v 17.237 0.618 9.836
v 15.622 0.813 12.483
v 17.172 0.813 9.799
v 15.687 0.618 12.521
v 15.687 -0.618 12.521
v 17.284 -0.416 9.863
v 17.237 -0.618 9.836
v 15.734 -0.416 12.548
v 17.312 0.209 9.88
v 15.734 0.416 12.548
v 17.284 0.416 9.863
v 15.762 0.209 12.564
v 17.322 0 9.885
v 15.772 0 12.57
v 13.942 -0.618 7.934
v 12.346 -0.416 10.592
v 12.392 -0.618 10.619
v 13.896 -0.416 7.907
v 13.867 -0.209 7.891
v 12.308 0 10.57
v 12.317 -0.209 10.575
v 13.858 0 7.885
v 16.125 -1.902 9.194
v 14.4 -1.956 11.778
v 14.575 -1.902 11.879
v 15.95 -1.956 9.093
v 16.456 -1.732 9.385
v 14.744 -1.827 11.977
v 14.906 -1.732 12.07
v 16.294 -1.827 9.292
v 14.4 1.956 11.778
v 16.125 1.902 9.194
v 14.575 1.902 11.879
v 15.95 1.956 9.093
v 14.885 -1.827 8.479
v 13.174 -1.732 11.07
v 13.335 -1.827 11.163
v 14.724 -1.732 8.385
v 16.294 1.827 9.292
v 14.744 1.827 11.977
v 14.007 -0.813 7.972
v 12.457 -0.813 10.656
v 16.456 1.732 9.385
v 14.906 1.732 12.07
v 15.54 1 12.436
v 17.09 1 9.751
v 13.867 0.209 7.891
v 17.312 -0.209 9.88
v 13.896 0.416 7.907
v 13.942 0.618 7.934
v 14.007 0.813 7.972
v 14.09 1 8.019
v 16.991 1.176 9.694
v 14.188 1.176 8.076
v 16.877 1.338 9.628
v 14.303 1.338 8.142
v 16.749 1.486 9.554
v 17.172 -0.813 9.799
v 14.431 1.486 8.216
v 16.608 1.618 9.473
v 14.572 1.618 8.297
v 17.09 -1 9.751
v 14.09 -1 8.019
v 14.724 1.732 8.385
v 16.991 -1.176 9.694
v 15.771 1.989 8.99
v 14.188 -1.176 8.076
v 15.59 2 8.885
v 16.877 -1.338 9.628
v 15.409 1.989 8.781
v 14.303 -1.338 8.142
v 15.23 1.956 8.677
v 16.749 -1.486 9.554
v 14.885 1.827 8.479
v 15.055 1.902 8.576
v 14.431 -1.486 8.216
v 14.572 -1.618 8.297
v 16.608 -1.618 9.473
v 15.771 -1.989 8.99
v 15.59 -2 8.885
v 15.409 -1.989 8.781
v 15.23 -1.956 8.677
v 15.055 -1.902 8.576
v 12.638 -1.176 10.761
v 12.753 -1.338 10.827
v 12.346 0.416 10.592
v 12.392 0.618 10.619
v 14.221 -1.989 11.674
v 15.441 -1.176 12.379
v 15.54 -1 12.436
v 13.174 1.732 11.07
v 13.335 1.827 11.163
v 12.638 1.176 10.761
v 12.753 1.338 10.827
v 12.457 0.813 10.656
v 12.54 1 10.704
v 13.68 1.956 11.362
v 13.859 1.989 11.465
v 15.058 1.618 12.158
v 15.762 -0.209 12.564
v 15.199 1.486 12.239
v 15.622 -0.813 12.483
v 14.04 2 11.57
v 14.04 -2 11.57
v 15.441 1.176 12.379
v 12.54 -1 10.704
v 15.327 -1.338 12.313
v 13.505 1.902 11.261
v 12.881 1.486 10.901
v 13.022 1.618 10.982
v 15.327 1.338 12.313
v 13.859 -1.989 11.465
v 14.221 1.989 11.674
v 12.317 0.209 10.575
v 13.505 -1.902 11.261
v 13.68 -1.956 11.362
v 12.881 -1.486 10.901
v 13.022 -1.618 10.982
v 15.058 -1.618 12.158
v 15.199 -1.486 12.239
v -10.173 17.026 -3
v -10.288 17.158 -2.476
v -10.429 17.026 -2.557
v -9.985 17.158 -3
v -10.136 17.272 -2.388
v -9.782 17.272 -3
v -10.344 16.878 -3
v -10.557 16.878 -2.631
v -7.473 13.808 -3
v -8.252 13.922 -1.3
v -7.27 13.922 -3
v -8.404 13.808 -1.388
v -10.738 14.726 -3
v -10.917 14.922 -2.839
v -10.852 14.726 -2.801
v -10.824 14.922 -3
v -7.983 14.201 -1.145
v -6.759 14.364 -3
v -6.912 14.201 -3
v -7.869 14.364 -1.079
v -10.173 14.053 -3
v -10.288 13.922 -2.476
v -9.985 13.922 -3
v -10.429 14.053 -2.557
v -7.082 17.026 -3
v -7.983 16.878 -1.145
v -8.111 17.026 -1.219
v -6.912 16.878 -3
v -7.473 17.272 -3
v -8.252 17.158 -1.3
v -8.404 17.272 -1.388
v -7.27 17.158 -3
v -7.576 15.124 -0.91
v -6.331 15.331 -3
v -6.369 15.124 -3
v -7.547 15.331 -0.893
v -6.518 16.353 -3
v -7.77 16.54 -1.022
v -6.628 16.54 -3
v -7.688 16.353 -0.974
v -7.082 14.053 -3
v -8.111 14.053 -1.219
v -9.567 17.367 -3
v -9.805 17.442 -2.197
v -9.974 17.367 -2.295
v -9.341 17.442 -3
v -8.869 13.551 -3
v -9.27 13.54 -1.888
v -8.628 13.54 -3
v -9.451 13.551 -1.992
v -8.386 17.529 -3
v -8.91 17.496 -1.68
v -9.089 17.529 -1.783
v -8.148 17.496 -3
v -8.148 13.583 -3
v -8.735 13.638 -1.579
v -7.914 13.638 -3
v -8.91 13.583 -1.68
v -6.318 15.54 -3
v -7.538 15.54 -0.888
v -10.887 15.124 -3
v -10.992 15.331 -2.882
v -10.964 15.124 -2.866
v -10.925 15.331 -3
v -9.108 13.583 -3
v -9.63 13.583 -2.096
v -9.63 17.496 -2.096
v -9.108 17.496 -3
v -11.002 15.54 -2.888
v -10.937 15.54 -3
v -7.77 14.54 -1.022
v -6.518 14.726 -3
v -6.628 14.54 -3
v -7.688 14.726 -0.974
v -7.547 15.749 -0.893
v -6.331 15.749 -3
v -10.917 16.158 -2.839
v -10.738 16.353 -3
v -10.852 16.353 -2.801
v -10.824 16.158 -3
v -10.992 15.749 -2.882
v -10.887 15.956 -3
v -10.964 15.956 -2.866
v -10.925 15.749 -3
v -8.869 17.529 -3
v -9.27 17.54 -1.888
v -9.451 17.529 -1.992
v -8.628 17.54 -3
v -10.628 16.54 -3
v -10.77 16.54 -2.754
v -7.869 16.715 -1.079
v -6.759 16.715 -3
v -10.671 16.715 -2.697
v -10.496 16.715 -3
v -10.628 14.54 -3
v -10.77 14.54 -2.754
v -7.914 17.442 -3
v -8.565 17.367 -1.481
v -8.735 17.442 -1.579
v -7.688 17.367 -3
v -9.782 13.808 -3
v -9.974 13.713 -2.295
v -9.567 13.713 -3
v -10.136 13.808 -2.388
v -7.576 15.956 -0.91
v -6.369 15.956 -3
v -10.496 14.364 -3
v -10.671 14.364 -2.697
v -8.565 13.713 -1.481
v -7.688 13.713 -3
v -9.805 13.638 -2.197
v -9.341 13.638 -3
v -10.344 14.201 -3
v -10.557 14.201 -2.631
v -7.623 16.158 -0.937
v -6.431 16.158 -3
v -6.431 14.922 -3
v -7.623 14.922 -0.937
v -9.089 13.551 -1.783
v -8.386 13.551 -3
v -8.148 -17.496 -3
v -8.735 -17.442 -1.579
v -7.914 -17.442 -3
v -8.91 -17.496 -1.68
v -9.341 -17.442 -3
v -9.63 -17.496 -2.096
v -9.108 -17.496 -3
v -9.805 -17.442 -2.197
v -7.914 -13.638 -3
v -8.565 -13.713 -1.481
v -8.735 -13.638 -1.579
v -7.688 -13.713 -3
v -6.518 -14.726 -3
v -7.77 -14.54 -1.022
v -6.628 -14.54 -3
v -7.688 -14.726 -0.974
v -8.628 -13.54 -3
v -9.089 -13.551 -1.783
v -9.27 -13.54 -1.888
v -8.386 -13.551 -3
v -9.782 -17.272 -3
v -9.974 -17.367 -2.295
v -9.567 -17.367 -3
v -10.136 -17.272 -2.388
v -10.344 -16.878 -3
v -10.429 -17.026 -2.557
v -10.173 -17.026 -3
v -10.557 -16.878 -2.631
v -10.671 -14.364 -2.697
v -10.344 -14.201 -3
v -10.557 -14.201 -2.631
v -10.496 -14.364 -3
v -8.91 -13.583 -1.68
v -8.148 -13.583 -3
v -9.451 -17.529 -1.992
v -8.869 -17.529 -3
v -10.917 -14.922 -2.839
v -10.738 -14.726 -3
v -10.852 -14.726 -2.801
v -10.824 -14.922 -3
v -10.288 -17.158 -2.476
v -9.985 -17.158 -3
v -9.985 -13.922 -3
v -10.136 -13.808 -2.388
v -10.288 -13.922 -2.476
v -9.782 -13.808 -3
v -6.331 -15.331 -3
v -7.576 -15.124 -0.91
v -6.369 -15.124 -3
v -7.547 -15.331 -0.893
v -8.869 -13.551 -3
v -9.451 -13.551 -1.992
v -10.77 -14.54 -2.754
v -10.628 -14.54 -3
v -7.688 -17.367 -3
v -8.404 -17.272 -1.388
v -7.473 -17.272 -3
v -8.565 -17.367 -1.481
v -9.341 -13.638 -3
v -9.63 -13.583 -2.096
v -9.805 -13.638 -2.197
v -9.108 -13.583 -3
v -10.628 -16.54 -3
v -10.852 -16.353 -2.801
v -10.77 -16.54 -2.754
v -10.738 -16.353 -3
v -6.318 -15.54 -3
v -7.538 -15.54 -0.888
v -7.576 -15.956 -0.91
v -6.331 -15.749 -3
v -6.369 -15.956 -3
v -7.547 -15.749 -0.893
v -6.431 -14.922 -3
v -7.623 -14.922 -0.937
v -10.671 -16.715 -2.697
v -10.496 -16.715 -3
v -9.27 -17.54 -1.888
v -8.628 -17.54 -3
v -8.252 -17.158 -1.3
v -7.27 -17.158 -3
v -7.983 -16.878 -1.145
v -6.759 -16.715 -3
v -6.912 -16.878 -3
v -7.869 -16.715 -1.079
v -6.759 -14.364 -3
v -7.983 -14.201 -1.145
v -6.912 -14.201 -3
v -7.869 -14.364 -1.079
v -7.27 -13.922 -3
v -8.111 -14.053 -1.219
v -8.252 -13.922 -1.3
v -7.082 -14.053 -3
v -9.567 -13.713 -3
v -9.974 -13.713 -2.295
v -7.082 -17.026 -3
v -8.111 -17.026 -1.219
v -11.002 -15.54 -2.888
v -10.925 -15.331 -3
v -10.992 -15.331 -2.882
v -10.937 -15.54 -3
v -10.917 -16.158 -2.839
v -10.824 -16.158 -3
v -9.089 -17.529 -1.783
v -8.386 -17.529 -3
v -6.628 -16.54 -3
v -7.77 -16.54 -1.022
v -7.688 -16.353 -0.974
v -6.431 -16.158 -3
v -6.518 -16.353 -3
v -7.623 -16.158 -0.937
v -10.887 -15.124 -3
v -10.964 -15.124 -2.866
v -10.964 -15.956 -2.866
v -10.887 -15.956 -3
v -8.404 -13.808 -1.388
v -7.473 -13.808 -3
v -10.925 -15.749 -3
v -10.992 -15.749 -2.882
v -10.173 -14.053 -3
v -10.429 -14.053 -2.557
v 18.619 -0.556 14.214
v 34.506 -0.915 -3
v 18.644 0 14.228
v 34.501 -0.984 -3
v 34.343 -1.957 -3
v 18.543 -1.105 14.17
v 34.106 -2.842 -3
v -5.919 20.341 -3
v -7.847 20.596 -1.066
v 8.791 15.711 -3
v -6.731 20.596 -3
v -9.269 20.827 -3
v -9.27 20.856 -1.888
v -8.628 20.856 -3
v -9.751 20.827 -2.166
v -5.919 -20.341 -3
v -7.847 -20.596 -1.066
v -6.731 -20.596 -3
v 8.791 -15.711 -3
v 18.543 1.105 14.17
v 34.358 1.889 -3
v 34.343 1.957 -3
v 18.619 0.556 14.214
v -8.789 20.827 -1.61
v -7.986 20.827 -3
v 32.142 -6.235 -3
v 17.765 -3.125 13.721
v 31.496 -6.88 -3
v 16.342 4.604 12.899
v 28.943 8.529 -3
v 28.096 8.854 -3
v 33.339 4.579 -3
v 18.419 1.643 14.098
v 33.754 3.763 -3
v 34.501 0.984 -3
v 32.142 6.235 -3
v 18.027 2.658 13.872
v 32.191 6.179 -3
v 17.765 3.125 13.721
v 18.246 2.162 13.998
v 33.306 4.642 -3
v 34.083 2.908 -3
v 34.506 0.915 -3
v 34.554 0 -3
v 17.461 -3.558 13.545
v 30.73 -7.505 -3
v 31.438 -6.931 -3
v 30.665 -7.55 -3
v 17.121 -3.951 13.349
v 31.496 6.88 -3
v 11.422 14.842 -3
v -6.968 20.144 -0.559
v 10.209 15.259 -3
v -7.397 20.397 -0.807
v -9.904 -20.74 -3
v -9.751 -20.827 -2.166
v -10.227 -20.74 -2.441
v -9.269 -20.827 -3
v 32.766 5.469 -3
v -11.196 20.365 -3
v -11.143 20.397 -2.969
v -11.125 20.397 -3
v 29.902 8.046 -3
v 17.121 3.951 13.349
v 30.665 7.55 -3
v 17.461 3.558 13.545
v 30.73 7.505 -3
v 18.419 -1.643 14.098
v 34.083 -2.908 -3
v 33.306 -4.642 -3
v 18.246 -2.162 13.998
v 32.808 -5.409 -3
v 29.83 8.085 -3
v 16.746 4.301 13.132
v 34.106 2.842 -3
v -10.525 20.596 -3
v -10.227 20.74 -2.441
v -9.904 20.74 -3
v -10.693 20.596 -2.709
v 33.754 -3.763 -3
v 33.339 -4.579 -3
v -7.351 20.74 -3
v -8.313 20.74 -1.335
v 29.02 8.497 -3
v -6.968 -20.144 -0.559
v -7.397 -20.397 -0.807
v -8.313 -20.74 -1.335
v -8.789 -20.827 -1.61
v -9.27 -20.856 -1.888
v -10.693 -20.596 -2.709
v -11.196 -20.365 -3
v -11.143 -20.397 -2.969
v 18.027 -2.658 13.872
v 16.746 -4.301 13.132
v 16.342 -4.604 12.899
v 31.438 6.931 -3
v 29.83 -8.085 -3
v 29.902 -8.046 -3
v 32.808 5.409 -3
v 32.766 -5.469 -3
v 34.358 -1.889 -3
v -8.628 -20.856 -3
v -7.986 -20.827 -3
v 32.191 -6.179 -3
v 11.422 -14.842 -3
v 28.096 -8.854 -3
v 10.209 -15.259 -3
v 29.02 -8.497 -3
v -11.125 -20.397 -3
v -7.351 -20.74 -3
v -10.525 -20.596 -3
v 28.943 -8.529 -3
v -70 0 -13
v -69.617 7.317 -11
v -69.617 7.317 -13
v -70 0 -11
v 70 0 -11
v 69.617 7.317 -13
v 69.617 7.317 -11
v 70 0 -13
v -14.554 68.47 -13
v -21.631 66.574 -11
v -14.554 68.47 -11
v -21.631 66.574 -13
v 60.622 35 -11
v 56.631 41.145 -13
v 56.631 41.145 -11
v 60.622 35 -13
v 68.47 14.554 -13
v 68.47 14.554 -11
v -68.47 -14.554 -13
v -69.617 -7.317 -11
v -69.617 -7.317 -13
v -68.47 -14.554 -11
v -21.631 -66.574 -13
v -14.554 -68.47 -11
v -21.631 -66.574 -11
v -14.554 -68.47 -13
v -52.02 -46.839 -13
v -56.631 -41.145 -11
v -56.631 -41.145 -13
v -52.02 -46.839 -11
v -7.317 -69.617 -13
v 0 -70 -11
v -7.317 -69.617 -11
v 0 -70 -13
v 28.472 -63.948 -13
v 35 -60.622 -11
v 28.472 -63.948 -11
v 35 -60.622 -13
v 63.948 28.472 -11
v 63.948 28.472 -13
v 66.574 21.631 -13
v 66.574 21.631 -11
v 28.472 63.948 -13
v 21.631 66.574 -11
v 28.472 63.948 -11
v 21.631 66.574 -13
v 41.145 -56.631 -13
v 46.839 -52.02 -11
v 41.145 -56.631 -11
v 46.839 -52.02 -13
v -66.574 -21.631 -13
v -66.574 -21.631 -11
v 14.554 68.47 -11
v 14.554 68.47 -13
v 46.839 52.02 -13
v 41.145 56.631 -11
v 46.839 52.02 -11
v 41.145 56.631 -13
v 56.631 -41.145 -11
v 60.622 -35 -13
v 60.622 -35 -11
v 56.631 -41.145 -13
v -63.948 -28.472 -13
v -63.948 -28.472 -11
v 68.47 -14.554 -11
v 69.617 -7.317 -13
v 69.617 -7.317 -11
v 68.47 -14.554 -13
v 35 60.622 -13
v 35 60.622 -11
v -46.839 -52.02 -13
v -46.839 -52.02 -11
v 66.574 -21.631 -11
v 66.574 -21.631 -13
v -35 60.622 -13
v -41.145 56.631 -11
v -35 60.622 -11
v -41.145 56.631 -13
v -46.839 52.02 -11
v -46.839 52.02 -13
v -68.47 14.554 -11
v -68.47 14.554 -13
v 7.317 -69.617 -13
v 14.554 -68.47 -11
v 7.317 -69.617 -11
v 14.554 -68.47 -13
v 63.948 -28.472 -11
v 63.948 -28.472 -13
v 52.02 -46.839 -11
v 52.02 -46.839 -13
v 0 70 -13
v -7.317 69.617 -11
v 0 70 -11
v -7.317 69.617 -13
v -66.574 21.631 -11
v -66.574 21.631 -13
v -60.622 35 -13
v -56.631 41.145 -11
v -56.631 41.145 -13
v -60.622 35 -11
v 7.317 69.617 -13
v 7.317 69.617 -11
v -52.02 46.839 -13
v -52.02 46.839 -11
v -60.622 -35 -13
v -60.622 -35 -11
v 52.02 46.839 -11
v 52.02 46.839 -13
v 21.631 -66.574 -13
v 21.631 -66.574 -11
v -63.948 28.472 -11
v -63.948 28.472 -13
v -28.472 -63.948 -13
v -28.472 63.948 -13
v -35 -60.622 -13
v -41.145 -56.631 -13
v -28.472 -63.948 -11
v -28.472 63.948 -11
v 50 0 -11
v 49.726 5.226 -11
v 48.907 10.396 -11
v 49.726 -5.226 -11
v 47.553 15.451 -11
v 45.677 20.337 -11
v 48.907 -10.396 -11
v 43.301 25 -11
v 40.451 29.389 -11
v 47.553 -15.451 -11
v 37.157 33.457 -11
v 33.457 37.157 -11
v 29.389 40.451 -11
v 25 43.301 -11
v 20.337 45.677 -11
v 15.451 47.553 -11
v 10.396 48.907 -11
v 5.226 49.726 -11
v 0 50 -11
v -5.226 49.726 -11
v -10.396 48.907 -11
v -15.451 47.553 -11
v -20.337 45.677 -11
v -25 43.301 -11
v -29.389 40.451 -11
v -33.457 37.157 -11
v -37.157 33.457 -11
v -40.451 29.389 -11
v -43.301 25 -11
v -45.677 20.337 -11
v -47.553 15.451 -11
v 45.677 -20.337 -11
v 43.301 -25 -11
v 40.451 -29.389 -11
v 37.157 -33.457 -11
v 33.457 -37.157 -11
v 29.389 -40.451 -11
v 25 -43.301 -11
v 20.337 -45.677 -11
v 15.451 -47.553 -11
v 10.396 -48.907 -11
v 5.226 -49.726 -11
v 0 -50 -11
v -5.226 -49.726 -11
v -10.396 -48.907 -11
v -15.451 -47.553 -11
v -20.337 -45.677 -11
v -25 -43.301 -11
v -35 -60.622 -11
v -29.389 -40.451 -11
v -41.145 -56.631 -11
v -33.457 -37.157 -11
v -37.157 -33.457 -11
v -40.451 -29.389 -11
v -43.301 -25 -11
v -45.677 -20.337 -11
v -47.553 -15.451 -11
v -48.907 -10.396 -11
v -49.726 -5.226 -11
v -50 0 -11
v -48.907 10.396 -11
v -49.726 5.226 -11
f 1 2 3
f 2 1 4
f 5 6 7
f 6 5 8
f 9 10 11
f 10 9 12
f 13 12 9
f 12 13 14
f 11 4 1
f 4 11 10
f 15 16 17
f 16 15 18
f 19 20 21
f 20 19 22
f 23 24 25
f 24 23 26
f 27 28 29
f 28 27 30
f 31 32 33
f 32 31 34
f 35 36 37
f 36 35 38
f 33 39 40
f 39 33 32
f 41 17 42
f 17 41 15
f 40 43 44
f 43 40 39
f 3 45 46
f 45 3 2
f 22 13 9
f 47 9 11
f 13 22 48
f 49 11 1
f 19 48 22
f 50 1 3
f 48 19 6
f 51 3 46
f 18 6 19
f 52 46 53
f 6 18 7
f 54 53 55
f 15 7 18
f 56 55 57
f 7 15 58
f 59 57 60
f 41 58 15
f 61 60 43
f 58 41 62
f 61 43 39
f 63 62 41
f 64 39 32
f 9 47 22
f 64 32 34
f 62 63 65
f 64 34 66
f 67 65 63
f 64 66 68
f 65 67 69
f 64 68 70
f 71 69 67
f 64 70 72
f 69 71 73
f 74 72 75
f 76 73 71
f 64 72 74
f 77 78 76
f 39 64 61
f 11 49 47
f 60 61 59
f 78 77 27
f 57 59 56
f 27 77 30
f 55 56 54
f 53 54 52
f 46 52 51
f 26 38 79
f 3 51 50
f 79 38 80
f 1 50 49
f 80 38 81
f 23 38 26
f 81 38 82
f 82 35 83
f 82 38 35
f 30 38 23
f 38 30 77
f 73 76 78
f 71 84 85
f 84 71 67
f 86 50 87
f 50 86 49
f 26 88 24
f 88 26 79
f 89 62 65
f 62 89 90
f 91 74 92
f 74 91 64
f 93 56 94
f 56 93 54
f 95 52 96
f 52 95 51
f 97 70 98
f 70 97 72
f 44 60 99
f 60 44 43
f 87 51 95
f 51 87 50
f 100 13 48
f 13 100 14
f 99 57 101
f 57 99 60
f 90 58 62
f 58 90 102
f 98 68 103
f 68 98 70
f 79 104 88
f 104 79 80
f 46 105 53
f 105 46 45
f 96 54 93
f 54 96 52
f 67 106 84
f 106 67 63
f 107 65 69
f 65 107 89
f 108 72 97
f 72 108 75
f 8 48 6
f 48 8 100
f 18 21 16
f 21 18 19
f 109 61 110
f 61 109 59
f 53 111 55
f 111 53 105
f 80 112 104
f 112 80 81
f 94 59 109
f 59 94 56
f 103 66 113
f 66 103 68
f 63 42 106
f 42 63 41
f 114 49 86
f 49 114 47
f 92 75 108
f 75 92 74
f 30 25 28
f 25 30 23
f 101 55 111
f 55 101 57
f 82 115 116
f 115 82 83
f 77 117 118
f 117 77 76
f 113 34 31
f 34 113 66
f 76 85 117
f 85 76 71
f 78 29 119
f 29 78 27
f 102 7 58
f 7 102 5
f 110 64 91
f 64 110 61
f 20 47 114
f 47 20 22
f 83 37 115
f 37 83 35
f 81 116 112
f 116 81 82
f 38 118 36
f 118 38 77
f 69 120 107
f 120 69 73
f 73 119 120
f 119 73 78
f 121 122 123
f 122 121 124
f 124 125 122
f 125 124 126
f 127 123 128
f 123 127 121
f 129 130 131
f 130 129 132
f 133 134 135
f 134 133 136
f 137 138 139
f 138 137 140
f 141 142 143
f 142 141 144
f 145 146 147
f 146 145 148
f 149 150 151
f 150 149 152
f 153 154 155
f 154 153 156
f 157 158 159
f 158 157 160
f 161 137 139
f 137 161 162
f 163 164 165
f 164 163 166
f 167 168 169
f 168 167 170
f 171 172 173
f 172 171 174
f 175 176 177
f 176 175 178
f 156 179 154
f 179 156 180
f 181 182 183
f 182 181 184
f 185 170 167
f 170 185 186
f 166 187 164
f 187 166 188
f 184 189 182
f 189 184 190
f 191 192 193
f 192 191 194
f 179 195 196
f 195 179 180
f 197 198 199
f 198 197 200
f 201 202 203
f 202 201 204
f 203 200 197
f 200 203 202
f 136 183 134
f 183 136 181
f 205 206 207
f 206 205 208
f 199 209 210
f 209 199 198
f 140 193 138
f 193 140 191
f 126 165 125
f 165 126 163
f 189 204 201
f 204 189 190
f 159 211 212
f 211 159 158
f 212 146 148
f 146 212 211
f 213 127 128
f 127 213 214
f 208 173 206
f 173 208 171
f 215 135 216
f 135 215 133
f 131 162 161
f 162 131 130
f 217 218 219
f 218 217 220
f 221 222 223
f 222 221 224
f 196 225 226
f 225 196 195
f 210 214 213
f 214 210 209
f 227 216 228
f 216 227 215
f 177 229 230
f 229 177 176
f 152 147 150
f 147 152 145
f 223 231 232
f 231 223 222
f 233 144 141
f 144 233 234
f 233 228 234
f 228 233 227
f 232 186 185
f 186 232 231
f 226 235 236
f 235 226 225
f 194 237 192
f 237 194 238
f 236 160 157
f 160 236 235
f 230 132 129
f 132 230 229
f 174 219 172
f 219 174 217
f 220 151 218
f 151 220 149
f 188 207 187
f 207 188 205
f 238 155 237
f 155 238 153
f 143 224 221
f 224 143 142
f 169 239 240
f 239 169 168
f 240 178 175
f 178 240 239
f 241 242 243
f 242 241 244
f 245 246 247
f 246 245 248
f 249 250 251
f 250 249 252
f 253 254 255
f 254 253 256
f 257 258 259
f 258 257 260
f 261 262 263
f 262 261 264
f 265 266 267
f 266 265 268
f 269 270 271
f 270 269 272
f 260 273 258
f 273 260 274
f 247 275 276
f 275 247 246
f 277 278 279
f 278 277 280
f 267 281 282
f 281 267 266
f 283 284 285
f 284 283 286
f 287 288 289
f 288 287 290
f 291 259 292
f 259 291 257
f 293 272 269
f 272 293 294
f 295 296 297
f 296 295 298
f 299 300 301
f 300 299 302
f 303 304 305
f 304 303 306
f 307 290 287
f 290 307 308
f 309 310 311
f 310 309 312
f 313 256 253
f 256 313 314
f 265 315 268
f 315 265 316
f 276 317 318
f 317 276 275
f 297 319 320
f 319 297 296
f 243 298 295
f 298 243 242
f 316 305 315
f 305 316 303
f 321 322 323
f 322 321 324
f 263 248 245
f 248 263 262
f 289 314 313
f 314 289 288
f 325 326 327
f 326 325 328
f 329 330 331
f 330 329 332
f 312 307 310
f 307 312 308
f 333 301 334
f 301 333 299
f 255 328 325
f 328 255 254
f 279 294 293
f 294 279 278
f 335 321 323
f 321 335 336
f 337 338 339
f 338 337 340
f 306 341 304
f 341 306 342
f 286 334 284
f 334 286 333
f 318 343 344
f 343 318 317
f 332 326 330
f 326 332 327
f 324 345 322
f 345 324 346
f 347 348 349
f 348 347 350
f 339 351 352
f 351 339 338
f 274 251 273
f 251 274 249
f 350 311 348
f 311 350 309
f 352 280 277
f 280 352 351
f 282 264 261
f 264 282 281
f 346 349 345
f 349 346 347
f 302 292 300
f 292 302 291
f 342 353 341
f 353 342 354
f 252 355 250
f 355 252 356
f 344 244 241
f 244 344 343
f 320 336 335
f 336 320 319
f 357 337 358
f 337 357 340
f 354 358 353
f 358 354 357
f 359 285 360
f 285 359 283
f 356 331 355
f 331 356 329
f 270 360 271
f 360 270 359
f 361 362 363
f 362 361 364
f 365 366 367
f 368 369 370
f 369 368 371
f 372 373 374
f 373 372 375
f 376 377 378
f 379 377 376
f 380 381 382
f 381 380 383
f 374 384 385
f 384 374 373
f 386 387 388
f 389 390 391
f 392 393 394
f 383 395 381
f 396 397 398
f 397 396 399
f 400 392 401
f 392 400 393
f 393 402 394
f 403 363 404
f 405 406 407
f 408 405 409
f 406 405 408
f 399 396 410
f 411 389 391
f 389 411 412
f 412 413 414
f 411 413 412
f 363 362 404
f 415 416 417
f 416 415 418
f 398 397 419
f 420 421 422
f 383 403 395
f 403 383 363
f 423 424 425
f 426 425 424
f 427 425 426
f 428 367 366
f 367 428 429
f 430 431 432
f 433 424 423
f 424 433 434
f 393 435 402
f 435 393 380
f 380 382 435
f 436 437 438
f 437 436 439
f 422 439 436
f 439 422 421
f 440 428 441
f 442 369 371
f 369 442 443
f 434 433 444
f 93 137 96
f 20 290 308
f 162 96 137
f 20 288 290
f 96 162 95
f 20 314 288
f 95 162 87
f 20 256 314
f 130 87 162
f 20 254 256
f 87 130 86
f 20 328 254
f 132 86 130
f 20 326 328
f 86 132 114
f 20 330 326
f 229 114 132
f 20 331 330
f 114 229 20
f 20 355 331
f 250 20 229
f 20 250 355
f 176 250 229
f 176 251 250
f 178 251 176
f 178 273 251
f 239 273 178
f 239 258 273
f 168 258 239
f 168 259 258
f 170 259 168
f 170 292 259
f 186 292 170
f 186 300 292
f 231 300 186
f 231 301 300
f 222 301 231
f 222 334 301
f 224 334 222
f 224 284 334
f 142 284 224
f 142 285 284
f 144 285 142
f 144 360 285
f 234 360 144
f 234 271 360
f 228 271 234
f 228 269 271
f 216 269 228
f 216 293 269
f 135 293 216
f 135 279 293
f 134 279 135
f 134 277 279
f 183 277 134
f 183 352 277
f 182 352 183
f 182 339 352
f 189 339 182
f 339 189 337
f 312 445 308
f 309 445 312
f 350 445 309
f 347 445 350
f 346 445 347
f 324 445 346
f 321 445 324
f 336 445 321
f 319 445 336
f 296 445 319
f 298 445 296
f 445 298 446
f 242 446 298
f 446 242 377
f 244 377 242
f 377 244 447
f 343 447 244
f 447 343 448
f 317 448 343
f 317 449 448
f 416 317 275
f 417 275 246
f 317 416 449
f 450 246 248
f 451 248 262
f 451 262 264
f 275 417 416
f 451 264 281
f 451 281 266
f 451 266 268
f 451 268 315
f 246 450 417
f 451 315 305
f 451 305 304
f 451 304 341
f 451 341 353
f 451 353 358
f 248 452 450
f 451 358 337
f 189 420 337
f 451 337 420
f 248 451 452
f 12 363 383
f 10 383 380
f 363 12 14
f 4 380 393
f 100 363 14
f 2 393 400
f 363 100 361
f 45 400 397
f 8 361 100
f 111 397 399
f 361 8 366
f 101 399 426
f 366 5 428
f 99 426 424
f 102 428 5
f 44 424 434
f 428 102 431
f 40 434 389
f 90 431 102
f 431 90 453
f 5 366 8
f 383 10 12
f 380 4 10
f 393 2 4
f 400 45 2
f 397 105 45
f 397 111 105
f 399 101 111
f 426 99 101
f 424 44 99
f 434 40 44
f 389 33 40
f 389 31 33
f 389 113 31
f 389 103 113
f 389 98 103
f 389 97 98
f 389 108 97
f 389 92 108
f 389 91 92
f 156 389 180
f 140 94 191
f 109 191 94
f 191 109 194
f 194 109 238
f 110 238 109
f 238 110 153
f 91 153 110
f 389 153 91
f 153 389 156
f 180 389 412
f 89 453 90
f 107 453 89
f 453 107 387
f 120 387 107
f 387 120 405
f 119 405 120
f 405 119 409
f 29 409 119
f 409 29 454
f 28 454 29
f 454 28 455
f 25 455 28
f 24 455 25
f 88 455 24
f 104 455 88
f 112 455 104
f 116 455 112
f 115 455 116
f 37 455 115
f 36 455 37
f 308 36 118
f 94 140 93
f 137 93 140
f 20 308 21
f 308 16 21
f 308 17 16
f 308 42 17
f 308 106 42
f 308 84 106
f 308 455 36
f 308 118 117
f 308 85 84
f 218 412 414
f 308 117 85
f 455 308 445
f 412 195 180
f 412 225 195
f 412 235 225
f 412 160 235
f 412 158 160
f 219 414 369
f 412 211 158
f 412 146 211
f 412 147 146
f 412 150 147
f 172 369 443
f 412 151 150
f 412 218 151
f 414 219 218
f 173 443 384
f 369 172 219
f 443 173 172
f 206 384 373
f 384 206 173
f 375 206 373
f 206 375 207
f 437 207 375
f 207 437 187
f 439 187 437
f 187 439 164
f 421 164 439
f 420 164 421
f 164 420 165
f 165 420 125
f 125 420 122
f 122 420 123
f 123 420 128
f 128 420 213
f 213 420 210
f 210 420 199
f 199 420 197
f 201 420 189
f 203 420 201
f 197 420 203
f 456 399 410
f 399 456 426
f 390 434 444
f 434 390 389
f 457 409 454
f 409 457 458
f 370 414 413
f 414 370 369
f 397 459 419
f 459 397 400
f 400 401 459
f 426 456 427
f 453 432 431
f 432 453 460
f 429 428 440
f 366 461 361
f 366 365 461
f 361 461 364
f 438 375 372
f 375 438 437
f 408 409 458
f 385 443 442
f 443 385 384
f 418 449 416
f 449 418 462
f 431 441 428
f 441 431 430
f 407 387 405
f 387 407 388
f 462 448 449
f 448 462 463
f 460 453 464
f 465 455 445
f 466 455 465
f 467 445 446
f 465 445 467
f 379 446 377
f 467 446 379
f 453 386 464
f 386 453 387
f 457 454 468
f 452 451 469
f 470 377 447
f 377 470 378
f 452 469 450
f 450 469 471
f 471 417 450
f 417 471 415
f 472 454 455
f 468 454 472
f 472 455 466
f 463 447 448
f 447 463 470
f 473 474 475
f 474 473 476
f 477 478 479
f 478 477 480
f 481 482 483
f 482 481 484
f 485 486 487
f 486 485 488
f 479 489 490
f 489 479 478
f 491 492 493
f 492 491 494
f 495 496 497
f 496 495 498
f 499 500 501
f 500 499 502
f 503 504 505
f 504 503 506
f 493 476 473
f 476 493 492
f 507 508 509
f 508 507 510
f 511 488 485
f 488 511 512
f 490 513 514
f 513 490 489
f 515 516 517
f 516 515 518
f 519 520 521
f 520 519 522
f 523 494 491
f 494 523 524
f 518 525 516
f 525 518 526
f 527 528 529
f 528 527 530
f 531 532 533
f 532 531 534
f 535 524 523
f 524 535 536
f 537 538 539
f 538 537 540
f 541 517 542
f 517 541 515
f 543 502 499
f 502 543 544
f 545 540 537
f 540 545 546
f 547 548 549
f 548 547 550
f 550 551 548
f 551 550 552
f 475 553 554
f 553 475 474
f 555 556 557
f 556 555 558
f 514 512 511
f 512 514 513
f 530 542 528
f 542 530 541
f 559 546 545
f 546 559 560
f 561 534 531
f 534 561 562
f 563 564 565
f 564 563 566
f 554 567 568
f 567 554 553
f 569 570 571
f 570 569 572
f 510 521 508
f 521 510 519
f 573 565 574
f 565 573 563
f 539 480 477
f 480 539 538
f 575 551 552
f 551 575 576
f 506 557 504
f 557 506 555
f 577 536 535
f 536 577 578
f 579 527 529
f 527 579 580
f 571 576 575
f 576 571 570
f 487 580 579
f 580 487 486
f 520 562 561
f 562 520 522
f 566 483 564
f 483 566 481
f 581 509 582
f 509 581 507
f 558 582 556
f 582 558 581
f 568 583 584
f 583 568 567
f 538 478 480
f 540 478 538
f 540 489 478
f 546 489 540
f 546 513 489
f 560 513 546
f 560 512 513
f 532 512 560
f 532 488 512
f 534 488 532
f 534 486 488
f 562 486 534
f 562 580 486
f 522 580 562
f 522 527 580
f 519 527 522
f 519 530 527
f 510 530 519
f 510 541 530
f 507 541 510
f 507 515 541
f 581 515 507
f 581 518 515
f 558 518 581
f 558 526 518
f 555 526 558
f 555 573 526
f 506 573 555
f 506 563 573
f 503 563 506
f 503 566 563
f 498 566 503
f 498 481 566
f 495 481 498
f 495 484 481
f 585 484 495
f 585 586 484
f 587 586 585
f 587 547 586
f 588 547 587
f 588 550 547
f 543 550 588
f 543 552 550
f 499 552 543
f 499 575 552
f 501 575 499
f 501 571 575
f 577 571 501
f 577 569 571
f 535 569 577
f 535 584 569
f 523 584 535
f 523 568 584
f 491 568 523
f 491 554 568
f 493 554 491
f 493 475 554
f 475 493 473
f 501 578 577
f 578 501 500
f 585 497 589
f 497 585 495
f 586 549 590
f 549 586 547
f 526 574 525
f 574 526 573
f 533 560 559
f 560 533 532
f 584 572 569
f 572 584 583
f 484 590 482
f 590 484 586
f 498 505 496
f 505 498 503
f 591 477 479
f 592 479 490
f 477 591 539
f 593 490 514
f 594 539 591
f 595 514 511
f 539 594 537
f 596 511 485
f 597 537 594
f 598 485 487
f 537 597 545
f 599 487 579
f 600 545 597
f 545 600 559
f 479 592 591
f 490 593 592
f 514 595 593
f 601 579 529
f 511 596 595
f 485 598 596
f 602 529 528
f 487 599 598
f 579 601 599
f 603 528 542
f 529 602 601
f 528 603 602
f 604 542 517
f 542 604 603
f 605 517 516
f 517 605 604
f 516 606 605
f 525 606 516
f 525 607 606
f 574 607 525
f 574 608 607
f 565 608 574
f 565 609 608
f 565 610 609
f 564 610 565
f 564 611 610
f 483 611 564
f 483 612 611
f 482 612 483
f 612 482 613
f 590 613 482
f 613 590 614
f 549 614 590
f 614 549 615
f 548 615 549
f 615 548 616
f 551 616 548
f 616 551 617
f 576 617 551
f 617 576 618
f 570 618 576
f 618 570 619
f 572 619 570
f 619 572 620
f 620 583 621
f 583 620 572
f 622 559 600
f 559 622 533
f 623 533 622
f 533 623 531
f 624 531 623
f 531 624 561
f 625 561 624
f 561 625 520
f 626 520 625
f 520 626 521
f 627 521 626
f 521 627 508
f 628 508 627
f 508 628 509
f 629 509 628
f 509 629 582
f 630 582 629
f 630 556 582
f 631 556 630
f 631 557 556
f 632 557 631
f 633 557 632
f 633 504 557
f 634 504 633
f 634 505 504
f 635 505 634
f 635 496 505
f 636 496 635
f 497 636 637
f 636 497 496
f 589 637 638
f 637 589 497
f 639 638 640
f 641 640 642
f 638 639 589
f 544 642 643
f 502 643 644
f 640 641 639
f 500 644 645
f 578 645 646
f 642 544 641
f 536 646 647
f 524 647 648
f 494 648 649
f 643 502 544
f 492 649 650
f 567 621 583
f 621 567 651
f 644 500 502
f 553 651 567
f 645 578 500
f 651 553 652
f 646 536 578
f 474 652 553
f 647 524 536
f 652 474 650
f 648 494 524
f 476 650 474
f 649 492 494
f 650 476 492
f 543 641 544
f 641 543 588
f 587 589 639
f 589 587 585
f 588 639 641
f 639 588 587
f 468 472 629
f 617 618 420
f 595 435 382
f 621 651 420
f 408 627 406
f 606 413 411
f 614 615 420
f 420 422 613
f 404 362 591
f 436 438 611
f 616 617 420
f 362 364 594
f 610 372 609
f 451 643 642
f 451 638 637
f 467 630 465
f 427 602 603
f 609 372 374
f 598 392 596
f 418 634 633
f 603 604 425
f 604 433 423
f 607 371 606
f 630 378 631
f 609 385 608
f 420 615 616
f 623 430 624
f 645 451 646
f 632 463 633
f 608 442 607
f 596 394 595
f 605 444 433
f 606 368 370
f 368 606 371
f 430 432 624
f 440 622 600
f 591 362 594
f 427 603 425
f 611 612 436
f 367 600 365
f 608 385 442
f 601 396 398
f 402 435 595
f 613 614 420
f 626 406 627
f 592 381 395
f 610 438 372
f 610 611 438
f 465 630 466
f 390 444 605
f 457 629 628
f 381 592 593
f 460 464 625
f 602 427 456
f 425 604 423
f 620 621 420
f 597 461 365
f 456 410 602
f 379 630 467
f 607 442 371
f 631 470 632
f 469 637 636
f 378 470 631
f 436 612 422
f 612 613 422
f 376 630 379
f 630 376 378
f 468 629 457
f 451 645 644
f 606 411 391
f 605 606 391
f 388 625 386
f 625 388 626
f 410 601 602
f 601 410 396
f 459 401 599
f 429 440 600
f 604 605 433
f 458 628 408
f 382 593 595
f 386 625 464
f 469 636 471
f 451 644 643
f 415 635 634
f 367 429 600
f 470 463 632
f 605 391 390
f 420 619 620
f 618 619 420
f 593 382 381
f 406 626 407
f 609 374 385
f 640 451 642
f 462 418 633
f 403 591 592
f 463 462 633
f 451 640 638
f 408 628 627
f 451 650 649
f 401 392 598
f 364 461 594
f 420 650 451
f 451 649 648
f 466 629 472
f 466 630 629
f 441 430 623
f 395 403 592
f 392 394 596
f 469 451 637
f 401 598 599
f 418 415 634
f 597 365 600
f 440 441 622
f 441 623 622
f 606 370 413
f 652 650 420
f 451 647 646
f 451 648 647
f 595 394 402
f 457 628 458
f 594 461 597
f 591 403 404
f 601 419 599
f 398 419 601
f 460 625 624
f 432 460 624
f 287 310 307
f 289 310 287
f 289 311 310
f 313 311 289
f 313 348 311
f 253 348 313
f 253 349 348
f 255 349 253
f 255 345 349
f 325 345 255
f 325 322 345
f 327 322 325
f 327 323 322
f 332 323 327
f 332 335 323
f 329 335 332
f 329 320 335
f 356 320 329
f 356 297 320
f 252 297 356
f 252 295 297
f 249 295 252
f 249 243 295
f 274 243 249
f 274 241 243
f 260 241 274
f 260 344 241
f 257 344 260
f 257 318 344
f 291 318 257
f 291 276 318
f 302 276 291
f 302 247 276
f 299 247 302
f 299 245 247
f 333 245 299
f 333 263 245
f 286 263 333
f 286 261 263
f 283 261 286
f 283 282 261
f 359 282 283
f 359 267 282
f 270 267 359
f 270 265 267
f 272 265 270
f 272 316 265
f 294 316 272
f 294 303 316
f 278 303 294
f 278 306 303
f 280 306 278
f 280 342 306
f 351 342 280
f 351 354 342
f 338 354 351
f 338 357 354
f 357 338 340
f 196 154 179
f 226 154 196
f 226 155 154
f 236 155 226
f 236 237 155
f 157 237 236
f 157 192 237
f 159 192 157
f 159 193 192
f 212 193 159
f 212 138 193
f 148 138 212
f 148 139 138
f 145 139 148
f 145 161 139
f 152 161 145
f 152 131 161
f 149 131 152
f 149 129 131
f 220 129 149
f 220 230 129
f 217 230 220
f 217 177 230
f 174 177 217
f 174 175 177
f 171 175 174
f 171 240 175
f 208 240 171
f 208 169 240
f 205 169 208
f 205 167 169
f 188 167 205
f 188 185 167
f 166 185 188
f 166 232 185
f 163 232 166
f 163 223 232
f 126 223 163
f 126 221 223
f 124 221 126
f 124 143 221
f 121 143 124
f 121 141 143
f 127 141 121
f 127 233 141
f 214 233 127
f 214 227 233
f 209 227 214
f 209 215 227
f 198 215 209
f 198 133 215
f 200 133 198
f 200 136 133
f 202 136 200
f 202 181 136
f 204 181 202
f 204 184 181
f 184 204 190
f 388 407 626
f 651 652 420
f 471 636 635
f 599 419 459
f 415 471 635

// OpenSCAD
$fn=60;

bottom_support=1;
side_support=0;

bearing_diameter = 11;
bearing_height = 3.8;
magnet_diameter = 13;
magnet_height = 4.2;

bolt_height = 3.6;
nut_height = 4.8;
bolt_radius=4.7;
bearing_spacing = 6.6;
board_thickness = 3.5;
bottom_thickness = 1.6;

total_height = bolt_height+magnet_height+nut_height+bearing_height+bearing_spacing+bearing_height+board_thickness + bottom_thickness;

module ocylinder(r, h) {
    translate([0, 0, -.1])
        cylinder(r=r, h=h+.2);
}

total_radius = total_height*.5;

board_dimension=18;
screw_diameter=4;

module mount() {
    difference() {  union() {
      difference() {
        hull() {
            translate([20, 0, -19])
            rotate([0, 30, 0])
            cylinder(r=10, h=2, center=true);
            for(i=[0:2]) {
                rotate(120*i)
                    translate([total_radius+total_height/16, 0, 0])
                        cylinder(h=3, r=total_height/6);
            }
         }
        for(i=[0:2]) {
            rotate(120*i)
               translate([total_radius+total_height/16, 0, 0])
                ocylinder(screw_diameter/2, 6);
        }
        
    }
    }

}


}

union() {
    translate([0, 0, -12])
    cylinder(r=70, h=2, center=true);
    
rotate([0, -30, 0])
    mount();
hull() {
    difference() {
        rotate([0, -30, 0])
              mount();
        translate([0, 0, 22])
        cube([100, 100, 50], center=true);
    }
    translate([0, 0, -12])
    cylinder(r=50, h=2, center=true);
}
}
